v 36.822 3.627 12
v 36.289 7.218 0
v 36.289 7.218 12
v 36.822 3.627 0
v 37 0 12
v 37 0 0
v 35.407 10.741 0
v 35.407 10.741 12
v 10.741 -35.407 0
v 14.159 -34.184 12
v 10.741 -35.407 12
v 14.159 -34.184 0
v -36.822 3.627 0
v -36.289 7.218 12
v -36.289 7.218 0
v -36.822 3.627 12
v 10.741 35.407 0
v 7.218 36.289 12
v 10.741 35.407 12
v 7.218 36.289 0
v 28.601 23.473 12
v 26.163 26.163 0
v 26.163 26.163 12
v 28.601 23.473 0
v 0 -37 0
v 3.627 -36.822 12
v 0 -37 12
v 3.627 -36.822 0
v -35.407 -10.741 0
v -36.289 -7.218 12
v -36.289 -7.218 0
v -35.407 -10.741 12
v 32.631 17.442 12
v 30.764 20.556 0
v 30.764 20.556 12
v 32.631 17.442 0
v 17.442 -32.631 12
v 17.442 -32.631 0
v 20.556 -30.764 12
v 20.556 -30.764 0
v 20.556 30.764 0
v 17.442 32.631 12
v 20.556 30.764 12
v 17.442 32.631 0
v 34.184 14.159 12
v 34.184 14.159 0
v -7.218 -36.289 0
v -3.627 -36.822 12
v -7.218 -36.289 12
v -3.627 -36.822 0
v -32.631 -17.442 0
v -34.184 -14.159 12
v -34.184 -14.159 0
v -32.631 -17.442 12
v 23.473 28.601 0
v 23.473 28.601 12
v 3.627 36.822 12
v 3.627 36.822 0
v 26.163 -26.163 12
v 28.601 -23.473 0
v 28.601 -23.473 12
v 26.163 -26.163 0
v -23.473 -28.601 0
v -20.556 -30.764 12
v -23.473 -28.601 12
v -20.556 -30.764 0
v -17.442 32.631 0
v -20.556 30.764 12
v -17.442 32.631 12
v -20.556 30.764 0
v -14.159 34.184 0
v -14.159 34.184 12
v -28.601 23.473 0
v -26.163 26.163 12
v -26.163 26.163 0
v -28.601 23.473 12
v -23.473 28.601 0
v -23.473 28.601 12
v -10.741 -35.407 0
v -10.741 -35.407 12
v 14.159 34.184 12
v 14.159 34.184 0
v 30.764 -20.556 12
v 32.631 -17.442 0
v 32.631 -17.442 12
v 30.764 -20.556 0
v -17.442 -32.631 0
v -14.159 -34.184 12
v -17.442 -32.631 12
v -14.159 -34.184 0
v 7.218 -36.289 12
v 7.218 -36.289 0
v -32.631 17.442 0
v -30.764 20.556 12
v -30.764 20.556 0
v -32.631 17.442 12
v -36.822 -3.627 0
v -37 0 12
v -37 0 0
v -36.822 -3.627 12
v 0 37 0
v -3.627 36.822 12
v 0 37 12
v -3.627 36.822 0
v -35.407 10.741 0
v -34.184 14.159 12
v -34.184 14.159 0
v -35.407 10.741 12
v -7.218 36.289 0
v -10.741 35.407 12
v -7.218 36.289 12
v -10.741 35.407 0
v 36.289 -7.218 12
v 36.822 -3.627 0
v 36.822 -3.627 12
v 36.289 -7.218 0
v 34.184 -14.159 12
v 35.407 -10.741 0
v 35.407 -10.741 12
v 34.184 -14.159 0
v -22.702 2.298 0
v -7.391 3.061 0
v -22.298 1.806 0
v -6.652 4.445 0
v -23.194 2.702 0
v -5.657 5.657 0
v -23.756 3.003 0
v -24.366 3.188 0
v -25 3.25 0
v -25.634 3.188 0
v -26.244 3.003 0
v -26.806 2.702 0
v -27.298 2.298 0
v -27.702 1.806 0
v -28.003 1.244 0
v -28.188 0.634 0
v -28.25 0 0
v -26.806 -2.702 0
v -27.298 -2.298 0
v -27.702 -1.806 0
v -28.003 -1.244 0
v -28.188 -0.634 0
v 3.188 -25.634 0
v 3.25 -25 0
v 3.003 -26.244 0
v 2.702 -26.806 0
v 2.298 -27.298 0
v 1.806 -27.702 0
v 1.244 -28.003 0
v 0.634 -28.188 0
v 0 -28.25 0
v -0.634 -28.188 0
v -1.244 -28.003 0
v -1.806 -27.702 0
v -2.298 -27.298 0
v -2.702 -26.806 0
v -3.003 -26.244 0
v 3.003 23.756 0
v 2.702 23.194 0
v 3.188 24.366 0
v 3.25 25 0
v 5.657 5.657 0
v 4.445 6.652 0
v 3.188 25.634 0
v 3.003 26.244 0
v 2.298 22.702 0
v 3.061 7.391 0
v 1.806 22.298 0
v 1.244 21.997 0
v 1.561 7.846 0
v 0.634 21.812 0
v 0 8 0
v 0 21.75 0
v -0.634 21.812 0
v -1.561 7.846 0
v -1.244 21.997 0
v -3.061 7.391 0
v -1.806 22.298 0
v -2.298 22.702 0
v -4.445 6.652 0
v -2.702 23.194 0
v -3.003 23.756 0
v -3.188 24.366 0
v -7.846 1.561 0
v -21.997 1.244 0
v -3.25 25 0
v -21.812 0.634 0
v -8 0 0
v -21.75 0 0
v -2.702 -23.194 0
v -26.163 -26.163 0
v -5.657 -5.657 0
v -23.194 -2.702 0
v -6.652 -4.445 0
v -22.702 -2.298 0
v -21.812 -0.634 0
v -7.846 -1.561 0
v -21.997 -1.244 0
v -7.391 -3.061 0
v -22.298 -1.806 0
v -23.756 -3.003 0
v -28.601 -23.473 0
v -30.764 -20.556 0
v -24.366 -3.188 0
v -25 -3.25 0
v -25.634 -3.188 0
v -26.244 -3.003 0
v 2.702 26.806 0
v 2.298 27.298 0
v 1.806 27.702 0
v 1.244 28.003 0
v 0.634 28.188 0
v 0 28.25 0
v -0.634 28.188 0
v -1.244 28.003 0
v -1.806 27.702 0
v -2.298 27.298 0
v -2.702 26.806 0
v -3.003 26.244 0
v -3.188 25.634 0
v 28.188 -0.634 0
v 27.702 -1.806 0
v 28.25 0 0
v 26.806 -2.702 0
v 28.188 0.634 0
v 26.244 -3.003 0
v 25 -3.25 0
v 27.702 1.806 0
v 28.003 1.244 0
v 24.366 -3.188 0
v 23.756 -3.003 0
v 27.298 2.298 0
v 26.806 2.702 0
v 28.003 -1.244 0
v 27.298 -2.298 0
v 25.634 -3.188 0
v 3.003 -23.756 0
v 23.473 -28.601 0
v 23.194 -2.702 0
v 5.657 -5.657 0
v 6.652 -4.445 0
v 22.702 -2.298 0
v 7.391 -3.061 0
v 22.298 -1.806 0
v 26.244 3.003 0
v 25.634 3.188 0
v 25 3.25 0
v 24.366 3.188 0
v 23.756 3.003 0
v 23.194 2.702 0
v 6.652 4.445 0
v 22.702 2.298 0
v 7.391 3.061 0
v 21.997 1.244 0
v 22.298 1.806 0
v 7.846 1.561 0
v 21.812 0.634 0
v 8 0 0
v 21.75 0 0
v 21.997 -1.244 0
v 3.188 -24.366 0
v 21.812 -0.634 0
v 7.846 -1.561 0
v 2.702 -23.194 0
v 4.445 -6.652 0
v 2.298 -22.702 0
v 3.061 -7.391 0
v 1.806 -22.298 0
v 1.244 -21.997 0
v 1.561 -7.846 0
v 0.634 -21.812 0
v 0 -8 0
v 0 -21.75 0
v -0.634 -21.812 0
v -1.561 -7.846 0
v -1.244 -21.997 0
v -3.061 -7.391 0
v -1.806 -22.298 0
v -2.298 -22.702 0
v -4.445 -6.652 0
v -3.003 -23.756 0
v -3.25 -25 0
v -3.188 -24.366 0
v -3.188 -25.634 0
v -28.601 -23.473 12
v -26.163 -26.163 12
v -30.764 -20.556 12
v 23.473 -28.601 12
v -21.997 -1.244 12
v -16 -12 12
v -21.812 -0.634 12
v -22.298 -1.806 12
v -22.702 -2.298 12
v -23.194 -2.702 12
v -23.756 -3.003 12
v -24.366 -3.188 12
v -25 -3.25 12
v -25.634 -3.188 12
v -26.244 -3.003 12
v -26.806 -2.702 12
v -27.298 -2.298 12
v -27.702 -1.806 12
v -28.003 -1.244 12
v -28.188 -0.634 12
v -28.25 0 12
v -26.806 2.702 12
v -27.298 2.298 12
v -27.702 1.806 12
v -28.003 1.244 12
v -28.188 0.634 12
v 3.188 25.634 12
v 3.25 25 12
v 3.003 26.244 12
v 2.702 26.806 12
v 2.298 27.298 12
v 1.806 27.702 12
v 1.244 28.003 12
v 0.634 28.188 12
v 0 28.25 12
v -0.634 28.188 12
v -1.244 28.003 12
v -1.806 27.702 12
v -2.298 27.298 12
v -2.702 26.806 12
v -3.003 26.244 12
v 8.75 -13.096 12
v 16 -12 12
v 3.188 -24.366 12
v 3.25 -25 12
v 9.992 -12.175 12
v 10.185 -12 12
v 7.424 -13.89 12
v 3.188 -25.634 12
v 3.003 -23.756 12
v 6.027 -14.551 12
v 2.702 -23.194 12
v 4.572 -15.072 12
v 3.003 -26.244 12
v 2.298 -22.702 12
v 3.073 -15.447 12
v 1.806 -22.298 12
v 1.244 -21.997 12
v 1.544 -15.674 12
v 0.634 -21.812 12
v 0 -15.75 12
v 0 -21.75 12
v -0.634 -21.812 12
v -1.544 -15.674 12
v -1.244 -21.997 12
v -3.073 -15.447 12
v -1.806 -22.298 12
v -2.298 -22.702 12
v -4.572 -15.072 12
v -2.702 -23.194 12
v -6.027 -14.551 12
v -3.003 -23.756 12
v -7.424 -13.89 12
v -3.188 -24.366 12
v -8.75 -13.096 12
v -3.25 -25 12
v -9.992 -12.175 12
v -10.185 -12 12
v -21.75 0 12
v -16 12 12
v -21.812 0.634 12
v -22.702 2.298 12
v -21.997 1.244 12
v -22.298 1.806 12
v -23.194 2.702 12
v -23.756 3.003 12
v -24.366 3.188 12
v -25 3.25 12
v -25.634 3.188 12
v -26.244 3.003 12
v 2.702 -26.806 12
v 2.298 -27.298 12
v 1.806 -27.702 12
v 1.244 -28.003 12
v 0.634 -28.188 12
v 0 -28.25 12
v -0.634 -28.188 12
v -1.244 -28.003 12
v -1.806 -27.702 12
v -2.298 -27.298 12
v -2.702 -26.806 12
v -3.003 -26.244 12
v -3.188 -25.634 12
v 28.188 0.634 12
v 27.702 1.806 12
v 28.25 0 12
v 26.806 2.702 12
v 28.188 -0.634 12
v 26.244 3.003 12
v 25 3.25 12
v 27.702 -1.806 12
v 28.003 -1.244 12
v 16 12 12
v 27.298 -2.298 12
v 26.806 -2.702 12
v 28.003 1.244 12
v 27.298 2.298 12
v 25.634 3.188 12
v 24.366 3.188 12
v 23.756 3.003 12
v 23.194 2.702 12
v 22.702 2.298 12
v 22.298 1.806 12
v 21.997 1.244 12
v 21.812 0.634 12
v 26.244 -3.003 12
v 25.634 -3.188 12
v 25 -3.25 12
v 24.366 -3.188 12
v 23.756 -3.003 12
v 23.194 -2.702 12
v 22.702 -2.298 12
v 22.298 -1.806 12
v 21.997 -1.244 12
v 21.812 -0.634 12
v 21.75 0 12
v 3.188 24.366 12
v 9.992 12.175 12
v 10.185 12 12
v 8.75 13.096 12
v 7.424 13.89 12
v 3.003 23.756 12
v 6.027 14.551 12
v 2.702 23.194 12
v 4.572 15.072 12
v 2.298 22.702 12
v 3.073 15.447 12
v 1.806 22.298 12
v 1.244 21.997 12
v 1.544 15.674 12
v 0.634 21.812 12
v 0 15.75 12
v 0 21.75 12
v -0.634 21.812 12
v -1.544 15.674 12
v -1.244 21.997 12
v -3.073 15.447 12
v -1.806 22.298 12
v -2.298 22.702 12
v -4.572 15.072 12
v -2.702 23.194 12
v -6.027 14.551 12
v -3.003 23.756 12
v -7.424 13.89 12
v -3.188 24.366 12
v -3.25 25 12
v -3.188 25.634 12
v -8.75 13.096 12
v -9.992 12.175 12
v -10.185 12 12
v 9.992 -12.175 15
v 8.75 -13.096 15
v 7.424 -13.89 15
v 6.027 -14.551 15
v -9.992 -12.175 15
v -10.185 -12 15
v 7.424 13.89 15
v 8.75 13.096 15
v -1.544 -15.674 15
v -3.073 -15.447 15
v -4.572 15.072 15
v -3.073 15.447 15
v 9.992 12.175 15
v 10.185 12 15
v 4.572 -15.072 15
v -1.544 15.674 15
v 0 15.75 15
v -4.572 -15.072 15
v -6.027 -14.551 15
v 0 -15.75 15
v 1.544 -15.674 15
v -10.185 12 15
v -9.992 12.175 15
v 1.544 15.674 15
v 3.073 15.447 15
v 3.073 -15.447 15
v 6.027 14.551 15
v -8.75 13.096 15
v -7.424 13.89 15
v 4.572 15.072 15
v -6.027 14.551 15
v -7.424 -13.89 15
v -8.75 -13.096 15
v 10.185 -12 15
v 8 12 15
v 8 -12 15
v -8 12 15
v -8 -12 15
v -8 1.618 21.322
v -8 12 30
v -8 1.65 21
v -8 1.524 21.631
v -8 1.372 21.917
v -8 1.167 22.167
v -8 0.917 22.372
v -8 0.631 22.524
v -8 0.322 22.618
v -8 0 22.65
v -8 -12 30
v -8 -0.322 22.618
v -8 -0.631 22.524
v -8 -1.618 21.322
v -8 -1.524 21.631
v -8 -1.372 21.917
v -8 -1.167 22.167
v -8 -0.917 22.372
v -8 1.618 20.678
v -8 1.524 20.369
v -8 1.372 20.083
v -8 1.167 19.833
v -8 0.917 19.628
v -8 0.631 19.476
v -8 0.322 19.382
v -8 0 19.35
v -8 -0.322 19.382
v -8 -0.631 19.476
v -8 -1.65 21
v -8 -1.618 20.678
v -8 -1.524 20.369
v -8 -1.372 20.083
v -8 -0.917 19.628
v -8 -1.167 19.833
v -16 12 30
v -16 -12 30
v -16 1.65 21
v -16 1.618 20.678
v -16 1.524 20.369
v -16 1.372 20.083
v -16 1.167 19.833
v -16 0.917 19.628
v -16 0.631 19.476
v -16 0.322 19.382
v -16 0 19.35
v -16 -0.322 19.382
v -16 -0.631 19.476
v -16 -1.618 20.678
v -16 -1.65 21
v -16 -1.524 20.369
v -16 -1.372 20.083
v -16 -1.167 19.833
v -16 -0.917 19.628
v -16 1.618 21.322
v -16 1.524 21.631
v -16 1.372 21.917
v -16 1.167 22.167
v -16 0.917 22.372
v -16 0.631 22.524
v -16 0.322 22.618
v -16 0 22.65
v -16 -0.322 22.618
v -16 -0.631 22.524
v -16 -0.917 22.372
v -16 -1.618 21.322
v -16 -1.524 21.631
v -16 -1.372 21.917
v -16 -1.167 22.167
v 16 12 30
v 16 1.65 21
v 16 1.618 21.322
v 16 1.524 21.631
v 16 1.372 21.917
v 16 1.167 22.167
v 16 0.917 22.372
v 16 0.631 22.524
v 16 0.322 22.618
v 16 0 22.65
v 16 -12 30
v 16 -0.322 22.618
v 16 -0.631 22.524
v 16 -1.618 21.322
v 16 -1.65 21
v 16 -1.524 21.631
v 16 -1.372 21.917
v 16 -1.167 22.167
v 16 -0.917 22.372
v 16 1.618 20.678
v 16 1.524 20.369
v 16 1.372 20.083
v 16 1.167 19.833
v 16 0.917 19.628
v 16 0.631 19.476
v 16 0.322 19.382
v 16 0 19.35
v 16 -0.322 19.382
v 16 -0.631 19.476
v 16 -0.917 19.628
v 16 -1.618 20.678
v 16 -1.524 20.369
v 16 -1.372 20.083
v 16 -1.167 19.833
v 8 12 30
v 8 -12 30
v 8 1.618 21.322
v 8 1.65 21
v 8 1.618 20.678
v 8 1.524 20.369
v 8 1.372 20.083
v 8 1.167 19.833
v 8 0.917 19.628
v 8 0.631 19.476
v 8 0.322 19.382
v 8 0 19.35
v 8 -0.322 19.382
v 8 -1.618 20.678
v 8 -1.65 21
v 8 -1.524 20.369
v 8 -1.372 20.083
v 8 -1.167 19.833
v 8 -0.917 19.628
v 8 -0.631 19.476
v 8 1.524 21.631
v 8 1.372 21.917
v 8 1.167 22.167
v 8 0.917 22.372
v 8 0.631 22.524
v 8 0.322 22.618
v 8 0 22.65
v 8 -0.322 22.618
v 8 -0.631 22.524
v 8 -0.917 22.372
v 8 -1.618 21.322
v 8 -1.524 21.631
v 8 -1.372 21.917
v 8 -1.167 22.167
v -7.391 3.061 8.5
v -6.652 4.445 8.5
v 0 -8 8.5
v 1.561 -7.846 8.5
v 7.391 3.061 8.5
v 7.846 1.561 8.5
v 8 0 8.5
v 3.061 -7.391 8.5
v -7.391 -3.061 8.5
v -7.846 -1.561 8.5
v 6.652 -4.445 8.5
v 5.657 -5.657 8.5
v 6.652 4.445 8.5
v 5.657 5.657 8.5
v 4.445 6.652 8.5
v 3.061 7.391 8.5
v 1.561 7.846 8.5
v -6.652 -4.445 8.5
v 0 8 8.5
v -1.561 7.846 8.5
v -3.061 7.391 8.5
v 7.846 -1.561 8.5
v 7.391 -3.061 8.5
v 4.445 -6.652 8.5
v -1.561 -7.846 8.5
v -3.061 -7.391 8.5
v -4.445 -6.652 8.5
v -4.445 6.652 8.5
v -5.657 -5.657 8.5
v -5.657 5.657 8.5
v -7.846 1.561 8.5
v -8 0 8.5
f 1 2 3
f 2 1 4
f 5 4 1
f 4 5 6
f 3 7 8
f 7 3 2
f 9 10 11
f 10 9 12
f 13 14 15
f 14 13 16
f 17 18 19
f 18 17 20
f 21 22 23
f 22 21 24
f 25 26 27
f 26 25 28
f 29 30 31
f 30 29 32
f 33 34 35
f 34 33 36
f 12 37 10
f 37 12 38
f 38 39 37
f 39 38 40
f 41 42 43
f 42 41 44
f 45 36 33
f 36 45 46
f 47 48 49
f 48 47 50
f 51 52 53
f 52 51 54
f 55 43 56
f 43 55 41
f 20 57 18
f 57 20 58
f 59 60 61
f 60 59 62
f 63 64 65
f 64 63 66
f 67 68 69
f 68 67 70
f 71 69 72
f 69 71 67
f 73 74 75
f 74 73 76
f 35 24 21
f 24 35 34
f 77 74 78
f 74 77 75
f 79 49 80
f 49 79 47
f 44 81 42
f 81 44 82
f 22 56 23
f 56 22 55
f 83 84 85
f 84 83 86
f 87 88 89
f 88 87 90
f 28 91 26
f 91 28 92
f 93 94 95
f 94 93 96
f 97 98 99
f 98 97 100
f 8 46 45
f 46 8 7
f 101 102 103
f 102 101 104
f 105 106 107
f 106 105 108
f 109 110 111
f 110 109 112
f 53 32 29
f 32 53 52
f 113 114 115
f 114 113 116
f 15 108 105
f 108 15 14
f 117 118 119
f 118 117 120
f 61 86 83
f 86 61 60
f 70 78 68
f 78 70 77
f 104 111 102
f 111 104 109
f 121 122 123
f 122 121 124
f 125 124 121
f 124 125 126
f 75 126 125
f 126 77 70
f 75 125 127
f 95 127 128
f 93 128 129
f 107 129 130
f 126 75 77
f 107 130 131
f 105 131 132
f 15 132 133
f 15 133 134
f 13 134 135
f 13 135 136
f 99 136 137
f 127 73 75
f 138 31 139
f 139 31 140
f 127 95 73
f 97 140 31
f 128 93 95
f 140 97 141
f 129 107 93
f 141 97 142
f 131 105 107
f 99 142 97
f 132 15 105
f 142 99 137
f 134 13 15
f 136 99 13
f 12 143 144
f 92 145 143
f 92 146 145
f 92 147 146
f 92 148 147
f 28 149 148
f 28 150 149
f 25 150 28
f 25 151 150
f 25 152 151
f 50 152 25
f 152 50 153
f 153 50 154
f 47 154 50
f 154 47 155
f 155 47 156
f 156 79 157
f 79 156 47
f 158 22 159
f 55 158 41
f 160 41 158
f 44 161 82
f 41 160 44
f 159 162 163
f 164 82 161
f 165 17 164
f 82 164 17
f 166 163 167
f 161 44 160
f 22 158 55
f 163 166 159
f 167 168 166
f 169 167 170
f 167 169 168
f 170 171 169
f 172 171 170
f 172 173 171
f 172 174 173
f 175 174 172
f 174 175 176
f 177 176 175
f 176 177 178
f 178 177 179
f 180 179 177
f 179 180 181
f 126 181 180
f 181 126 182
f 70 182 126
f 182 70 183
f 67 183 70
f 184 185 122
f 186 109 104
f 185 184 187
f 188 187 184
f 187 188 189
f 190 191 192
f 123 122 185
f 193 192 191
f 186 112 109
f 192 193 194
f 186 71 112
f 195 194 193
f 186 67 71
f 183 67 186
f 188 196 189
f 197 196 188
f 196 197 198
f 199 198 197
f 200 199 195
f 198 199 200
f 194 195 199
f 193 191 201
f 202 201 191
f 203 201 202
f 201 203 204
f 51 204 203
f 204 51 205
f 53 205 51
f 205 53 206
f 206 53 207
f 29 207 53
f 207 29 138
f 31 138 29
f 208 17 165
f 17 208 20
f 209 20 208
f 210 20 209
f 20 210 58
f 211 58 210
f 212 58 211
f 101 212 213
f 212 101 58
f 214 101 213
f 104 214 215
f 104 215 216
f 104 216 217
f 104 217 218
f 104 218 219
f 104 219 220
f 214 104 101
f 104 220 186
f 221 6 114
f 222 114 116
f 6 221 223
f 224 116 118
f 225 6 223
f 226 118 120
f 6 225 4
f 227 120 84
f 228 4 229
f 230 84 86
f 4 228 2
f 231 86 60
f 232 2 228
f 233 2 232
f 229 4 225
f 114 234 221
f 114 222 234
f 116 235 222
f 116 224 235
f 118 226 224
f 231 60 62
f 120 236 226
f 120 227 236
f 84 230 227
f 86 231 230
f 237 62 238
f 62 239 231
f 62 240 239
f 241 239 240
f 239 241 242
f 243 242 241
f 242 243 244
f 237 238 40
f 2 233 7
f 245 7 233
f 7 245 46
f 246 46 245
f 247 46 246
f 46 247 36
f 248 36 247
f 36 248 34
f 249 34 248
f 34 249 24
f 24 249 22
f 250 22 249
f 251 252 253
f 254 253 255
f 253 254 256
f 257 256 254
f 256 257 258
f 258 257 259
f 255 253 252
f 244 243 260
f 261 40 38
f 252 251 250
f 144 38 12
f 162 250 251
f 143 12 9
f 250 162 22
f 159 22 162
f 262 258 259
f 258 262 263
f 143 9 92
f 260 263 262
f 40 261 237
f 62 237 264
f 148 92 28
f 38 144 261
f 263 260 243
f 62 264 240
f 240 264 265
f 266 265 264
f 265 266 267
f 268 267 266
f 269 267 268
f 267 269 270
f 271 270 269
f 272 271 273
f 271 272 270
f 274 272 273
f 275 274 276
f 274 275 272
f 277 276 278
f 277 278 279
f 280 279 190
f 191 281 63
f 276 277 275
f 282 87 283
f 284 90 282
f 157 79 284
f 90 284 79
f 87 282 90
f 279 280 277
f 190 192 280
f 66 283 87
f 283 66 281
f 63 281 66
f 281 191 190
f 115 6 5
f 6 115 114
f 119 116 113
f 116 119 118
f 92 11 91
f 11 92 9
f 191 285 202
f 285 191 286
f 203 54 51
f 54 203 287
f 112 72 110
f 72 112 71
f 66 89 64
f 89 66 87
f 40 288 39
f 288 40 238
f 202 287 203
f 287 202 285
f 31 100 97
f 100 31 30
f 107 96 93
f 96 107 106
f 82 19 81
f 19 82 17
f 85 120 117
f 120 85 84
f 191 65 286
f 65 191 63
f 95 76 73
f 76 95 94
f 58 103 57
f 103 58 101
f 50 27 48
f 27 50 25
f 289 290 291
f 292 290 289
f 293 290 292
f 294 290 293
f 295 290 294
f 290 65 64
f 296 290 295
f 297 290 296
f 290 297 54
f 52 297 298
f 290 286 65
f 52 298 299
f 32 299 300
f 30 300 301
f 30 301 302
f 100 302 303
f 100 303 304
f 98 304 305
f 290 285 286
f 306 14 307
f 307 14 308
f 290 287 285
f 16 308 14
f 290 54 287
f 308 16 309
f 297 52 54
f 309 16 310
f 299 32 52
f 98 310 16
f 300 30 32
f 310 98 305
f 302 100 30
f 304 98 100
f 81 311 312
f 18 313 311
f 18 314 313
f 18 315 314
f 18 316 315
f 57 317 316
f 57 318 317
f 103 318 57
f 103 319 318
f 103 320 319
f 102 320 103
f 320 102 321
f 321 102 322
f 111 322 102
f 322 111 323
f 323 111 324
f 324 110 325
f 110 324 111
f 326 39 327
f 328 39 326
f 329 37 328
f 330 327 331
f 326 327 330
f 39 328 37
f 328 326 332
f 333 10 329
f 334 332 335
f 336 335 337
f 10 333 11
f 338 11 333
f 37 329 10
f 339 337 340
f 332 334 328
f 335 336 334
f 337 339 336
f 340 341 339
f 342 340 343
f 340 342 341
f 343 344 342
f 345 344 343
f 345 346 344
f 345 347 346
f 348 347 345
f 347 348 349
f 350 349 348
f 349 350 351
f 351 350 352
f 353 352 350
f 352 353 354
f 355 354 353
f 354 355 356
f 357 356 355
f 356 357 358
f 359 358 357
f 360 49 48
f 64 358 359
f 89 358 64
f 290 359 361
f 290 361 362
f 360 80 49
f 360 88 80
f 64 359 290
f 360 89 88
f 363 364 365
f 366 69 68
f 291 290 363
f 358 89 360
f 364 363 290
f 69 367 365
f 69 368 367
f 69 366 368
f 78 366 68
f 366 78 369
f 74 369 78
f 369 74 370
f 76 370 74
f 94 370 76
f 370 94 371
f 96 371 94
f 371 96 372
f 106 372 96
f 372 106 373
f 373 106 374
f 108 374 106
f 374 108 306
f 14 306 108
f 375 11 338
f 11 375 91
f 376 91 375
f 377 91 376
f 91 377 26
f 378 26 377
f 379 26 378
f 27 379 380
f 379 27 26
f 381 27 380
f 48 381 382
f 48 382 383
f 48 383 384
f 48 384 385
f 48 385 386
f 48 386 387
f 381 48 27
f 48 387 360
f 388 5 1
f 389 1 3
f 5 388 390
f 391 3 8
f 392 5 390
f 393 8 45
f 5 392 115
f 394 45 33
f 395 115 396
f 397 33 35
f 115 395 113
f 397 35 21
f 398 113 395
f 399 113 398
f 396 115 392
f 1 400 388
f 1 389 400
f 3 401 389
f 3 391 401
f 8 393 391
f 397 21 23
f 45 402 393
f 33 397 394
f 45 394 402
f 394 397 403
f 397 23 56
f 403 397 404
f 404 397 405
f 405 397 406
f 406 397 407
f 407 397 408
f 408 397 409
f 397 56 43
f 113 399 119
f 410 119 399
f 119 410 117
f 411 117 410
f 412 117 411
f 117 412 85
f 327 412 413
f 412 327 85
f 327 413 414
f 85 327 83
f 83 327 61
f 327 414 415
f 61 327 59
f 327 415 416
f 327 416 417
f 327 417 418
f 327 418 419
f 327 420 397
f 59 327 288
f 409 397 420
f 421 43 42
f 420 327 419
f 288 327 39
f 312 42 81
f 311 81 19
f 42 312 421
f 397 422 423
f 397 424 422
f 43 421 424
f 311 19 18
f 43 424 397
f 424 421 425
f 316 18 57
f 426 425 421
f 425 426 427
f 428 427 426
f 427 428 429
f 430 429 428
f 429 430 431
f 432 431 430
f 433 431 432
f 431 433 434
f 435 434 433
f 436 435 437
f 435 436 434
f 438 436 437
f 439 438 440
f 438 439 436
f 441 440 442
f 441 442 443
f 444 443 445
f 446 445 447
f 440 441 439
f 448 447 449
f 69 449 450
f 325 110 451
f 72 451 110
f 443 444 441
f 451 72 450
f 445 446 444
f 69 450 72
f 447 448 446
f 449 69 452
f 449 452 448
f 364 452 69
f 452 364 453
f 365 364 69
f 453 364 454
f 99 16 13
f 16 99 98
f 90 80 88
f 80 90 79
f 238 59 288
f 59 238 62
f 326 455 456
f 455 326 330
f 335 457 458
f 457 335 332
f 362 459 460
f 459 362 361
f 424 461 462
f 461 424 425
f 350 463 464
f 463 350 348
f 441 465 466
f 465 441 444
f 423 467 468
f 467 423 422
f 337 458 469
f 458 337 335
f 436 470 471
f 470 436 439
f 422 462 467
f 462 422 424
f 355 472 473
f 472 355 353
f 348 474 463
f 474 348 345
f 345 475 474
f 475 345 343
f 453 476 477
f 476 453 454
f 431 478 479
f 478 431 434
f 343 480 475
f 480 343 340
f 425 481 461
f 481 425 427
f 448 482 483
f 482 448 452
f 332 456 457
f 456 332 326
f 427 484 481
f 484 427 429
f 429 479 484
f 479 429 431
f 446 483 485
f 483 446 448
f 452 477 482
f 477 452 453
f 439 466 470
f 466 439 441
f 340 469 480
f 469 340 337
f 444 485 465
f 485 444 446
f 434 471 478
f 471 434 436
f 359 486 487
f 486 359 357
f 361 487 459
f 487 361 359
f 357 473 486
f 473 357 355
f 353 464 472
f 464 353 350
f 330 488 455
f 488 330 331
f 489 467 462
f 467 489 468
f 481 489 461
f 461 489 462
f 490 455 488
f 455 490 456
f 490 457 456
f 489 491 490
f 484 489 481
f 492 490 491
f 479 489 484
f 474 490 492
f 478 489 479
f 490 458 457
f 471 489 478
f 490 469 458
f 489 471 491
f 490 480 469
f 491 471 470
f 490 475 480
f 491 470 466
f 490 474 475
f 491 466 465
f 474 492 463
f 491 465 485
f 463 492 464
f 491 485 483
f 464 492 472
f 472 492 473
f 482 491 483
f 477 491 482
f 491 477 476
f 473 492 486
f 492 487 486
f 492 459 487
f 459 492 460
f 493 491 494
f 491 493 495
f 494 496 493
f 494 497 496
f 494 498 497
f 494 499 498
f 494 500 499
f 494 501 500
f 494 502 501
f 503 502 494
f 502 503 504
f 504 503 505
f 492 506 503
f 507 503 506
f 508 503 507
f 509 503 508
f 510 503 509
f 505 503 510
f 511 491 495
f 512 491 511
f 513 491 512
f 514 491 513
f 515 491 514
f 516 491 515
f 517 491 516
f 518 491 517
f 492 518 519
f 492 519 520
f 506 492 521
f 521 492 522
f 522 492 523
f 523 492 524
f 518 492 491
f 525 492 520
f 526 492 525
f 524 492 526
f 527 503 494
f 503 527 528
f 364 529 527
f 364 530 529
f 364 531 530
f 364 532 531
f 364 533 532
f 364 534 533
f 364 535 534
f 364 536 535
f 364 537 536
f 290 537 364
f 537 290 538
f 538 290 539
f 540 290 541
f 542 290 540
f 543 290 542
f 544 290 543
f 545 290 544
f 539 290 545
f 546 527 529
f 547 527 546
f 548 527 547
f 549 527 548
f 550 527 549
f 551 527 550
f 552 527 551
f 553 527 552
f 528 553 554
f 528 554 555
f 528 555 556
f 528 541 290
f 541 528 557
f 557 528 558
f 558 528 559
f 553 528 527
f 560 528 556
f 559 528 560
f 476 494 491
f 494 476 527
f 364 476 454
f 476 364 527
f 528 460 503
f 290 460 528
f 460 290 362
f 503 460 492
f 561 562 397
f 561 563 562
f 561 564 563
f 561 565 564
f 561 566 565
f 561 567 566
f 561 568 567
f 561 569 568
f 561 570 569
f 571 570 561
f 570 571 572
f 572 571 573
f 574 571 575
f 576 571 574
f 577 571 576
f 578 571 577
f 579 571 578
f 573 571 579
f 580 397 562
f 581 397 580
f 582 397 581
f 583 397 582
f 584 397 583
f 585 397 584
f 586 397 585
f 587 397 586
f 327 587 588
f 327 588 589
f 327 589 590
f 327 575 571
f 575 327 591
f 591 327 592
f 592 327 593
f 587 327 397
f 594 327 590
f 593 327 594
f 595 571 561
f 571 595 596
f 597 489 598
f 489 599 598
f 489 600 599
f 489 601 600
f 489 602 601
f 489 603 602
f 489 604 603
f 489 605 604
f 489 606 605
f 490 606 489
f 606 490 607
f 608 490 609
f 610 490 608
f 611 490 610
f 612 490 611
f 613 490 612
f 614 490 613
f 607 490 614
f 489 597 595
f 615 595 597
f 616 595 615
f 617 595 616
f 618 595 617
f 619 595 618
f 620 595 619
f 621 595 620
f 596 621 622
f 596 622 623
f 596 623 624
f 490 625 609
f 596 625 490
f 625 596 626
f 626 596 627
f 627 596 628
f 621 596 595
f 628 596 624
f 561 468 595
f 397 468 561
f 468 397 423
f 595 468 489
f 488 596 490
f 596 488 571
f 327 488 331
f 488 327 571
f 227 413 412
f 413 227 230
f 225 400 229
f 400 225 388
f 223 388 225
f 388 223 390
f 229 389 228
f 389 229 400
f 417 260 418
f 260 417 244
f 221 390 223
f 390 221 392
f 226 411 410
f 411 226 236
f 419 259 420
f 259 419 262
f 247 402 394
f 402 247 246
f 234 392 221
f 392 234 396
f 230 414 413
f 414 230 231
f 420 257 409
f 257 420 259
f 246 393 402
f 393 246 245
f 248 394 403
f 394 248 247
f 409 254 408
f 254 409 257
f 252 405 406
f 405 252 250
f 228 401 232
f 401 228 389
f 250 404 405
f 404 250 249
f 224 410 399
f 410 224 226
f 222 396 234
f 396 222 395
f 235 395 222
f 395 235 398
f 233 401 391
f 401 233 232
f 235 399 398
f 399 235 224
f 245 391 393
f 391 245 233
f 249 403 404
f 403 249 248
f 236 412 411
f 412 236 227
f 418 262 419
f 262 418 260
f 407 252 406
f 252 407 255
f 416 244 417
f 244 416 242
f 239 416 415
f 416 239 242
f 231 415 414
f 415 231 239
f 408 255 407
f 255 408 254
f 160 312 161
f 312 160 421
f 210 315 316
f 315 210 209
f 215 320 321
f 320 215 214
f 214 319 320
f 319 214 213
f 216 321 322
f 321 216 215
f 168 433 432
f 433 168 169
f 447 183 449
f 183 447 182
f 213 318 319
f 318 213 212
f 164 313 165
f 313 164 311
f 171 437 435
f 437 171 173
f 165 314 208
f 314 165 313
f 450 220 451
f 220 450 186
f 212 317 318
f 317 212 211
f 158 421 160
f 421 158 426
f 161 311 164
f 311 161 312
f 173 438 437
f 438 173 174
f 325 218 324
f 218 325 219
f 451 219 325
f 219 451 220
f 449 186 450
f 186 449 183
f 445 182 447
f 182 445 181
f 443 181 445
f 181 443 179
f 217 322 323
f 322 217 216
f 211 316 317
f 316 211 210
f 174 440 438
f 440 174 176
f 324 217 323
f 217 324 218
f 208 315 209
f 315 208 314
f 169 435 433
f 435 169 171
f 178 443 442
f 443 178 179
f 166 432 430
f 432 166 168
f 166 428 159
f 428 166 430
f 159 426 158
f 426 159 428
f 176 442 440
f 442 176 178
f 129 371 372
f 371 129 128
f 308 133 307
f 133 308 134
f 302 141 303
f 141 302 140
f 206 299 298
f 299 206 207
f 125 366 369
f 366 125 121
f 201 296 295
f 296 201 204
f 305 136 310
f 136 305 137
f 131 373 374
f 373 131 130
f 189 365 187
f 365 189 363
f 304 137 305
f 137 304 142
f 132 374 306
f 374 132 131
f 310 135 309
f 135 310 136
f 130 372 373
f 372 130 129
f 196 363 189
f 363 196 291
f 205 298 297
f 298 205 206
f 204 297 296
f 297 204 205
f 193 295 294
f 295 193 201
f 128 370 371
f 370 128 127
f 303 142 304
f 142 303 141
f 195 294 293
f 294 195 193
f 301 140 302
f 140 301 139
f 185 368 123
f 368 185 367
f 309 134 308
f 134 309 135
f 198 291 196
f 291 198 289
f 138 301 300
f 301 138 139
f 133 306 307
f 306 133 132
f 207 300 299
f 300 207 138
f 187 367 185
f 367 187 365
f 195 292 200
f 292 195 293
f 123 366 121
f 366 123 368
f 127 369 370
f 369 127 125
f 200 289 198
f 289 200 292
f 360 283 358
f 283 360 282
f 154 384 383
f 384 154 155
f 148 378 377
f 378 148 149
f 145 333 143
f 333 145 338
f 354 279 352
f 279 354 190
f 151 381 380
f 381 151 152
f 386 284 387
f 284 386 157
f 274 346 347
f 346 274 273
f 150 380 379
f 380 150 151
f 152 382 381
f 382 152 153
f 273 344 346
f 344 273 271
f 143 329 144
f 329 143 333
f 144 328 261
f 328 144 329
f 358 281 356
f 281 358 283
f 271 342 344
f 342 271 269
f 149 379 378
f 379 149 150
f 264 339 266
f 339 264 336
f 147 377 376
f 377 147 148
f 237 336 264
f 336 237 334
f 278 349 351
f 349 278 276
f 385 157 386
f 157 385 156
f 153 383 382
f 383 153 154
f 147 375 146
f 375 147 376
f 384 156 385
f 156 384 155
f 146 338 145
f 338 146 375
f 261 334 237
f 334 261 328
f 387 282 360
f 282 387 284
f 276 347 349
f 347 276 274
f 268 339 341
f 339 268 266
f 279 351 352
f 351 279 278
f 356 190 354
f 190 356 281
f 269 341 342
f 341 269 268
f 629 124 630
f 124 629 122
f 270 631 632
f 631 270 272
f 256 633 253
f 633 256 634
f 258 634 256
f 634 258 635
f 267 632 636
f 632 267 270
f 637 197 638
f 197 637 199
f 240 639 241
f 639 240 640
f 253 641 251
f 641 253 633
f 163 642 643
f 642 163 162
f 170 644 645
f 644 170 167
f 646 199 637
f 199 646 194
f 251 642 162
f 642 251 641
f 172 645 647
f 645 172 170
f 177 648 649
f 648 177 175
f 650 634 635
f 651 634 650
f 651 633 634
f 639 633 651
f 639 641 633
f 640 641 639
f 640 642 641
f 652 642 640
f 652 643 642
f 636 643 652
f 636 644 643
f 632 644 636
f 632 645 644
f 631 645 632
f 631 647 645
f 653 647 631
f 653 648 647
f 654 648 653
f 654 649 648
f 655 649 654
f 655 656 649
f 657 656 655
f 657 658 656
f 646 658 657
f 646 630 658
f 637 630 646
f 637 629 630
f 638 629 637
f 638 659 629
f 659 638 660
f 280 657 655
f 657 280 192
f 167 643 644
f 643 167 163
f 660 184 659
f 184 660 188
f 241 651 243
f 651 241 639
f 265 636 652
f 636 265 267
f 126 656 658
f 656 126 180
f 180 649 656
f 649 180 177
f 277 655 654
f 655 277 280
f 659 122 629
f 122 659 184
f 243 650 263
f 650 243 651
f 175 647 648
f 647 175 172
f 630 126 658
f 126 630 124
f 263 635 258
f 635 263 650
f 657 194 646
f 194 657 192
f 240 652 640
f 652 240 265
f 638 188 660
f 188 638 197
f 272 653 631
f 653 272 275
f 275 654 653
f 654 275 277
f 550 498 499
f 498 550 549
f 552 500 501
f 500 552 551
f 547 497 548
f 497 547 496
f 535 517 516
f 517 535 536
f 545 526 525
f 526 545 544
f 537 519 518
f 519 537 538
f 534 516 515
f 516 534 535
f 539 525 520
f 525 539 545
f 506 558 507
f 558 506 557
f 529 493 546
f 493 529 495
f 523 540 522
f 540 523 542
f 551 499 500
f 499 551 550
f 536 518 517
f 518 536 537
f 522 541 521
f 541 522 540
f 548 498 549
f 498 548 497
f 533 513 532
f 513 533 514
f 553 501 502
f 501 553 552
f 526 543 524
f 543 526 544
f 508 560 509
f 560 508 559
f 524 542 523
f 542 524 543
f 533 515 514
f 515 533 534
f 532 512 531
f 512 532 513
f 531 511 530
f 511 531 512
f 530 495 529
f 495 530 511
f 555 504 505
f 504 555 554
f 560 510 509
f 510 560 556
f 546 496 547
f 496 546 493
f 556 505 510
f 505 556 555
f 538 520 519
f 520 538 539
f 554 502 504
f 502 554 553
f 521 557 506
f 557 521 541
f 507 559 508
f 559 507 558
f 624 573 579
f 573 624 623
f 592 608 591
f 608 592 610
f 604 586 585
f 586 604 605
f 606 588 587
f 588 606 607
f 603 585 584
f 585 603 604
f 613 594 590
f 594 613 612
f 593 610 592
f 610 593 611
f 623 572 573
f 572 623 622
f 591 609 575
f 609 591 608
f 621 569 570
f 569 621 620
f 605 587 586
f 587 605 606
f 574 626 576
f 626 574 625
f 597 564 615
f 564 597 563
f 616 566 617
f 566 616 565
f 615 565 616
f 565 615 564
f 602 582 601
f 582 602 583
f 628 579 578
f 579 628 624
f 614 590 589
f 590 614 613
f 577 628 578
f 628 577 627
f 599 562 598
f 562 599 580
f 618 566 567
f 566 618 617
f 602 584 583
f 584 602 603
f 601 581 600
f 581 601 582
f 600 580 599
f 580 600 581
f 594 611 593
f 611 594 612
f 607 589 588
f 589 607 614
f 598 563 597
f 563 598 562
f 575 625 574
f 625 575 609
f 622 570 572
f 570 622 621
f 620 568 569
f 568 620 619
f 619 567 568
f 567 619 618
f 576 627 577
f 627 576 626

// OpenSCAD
// ==============================================================================
// ENPIRE Universal Robot Flange & Gripper Adapter
// OpenSCAD Source File for ISO 9409-1 Flange & Custom Robot Arm Interfaces
// ==============================================================================

/* [Flange Configuration] */
flange_standard     = "ISO_50_4_M6"; // [ISO_50_4_M6, ISO_31_5_4_M5, Custom]
flange_thickness    = 12.0;          // Base plate thickness (mm)
pilot_diameter      = 31.5;          // Central locating boss / pilot diameter (mm)
pilot_height        = 3.0;           // Locating boss protrusion (mm)
pcd_diameter        = 50.0;          // Pitch Circle Diameter (PCD) for mounting bolts
bolt_hole_diam      = 6.5;           // Bolt hole diameter (6.5mm for M6, 5.5mm for M5)
num_bolts           = 4;             // Number of mounting holes (standard 4 or 6)

/* [Gripper Interface Bracket] */
bracket_height      = 18.0;          // Height of the gripper mounting uprights
bracket_spacing     = 24.0;          // Distance between upright brackets
bracket_screw_diam  = 3.3;           // M3 mounting holes for ENPIRE fingers

// ------------------------------------------------------------------------------
// Geometry
// ------------------------------------------------------------------------------

module flange_base() {
    difference() {
        union() {
            cylinder(h=flange_thickness, r=(pcd_diameter/2) + 12, $fn=64);
            translate([0, 0, flange_thickness])
                cylinder(h=pilot_height, r=pilot_diameter/2, $fn=64);
                
            // Upright mounting brackets for gripper fingers
            translate([-bracket_spacing/2 - 4, -12, flange_thickness])
                cube([8, 24, bracket_height]);
            translate([bracket_spacing/2 - 4, -12, flange_thickness])
                cube([8, 24, bracket_height]);
        }
        
        // Center cable / pneumatic passthrough
        cylinder(h=flange_thickness + pilot_height + 2, r=8.0, center=true, $fn=32);
        
        // Circular bolt hole pattern
        for (i = [0 : num_bolts - 1]) {
            angle = i * (360 / num_bolts);
            rotate([0, 0, angle])
                translate([pcd_diameter/2, 0, -1])
                    cylinder(h=flange_thickness + 2, r=bolt_hole_diam/2, $fn=32);
        }
        
        // Upright mounting screw holes
        translate([-bracket_spacing/2, 0, flange_thickness + bracket_height/2])
            rotate([0, 90, 0])
                cylinder(h=12, r=bracket_screw_diam/2, center=true, $fn=32);
        translate([bracket_spacing/2, 0, flange_thickness + bracket_height/2])
            rotate([0, 90, 0])
                cylinder(h=12, r=bracket_screw_diam/2, center=true, $fn=32);
    }
}

flange_base();
